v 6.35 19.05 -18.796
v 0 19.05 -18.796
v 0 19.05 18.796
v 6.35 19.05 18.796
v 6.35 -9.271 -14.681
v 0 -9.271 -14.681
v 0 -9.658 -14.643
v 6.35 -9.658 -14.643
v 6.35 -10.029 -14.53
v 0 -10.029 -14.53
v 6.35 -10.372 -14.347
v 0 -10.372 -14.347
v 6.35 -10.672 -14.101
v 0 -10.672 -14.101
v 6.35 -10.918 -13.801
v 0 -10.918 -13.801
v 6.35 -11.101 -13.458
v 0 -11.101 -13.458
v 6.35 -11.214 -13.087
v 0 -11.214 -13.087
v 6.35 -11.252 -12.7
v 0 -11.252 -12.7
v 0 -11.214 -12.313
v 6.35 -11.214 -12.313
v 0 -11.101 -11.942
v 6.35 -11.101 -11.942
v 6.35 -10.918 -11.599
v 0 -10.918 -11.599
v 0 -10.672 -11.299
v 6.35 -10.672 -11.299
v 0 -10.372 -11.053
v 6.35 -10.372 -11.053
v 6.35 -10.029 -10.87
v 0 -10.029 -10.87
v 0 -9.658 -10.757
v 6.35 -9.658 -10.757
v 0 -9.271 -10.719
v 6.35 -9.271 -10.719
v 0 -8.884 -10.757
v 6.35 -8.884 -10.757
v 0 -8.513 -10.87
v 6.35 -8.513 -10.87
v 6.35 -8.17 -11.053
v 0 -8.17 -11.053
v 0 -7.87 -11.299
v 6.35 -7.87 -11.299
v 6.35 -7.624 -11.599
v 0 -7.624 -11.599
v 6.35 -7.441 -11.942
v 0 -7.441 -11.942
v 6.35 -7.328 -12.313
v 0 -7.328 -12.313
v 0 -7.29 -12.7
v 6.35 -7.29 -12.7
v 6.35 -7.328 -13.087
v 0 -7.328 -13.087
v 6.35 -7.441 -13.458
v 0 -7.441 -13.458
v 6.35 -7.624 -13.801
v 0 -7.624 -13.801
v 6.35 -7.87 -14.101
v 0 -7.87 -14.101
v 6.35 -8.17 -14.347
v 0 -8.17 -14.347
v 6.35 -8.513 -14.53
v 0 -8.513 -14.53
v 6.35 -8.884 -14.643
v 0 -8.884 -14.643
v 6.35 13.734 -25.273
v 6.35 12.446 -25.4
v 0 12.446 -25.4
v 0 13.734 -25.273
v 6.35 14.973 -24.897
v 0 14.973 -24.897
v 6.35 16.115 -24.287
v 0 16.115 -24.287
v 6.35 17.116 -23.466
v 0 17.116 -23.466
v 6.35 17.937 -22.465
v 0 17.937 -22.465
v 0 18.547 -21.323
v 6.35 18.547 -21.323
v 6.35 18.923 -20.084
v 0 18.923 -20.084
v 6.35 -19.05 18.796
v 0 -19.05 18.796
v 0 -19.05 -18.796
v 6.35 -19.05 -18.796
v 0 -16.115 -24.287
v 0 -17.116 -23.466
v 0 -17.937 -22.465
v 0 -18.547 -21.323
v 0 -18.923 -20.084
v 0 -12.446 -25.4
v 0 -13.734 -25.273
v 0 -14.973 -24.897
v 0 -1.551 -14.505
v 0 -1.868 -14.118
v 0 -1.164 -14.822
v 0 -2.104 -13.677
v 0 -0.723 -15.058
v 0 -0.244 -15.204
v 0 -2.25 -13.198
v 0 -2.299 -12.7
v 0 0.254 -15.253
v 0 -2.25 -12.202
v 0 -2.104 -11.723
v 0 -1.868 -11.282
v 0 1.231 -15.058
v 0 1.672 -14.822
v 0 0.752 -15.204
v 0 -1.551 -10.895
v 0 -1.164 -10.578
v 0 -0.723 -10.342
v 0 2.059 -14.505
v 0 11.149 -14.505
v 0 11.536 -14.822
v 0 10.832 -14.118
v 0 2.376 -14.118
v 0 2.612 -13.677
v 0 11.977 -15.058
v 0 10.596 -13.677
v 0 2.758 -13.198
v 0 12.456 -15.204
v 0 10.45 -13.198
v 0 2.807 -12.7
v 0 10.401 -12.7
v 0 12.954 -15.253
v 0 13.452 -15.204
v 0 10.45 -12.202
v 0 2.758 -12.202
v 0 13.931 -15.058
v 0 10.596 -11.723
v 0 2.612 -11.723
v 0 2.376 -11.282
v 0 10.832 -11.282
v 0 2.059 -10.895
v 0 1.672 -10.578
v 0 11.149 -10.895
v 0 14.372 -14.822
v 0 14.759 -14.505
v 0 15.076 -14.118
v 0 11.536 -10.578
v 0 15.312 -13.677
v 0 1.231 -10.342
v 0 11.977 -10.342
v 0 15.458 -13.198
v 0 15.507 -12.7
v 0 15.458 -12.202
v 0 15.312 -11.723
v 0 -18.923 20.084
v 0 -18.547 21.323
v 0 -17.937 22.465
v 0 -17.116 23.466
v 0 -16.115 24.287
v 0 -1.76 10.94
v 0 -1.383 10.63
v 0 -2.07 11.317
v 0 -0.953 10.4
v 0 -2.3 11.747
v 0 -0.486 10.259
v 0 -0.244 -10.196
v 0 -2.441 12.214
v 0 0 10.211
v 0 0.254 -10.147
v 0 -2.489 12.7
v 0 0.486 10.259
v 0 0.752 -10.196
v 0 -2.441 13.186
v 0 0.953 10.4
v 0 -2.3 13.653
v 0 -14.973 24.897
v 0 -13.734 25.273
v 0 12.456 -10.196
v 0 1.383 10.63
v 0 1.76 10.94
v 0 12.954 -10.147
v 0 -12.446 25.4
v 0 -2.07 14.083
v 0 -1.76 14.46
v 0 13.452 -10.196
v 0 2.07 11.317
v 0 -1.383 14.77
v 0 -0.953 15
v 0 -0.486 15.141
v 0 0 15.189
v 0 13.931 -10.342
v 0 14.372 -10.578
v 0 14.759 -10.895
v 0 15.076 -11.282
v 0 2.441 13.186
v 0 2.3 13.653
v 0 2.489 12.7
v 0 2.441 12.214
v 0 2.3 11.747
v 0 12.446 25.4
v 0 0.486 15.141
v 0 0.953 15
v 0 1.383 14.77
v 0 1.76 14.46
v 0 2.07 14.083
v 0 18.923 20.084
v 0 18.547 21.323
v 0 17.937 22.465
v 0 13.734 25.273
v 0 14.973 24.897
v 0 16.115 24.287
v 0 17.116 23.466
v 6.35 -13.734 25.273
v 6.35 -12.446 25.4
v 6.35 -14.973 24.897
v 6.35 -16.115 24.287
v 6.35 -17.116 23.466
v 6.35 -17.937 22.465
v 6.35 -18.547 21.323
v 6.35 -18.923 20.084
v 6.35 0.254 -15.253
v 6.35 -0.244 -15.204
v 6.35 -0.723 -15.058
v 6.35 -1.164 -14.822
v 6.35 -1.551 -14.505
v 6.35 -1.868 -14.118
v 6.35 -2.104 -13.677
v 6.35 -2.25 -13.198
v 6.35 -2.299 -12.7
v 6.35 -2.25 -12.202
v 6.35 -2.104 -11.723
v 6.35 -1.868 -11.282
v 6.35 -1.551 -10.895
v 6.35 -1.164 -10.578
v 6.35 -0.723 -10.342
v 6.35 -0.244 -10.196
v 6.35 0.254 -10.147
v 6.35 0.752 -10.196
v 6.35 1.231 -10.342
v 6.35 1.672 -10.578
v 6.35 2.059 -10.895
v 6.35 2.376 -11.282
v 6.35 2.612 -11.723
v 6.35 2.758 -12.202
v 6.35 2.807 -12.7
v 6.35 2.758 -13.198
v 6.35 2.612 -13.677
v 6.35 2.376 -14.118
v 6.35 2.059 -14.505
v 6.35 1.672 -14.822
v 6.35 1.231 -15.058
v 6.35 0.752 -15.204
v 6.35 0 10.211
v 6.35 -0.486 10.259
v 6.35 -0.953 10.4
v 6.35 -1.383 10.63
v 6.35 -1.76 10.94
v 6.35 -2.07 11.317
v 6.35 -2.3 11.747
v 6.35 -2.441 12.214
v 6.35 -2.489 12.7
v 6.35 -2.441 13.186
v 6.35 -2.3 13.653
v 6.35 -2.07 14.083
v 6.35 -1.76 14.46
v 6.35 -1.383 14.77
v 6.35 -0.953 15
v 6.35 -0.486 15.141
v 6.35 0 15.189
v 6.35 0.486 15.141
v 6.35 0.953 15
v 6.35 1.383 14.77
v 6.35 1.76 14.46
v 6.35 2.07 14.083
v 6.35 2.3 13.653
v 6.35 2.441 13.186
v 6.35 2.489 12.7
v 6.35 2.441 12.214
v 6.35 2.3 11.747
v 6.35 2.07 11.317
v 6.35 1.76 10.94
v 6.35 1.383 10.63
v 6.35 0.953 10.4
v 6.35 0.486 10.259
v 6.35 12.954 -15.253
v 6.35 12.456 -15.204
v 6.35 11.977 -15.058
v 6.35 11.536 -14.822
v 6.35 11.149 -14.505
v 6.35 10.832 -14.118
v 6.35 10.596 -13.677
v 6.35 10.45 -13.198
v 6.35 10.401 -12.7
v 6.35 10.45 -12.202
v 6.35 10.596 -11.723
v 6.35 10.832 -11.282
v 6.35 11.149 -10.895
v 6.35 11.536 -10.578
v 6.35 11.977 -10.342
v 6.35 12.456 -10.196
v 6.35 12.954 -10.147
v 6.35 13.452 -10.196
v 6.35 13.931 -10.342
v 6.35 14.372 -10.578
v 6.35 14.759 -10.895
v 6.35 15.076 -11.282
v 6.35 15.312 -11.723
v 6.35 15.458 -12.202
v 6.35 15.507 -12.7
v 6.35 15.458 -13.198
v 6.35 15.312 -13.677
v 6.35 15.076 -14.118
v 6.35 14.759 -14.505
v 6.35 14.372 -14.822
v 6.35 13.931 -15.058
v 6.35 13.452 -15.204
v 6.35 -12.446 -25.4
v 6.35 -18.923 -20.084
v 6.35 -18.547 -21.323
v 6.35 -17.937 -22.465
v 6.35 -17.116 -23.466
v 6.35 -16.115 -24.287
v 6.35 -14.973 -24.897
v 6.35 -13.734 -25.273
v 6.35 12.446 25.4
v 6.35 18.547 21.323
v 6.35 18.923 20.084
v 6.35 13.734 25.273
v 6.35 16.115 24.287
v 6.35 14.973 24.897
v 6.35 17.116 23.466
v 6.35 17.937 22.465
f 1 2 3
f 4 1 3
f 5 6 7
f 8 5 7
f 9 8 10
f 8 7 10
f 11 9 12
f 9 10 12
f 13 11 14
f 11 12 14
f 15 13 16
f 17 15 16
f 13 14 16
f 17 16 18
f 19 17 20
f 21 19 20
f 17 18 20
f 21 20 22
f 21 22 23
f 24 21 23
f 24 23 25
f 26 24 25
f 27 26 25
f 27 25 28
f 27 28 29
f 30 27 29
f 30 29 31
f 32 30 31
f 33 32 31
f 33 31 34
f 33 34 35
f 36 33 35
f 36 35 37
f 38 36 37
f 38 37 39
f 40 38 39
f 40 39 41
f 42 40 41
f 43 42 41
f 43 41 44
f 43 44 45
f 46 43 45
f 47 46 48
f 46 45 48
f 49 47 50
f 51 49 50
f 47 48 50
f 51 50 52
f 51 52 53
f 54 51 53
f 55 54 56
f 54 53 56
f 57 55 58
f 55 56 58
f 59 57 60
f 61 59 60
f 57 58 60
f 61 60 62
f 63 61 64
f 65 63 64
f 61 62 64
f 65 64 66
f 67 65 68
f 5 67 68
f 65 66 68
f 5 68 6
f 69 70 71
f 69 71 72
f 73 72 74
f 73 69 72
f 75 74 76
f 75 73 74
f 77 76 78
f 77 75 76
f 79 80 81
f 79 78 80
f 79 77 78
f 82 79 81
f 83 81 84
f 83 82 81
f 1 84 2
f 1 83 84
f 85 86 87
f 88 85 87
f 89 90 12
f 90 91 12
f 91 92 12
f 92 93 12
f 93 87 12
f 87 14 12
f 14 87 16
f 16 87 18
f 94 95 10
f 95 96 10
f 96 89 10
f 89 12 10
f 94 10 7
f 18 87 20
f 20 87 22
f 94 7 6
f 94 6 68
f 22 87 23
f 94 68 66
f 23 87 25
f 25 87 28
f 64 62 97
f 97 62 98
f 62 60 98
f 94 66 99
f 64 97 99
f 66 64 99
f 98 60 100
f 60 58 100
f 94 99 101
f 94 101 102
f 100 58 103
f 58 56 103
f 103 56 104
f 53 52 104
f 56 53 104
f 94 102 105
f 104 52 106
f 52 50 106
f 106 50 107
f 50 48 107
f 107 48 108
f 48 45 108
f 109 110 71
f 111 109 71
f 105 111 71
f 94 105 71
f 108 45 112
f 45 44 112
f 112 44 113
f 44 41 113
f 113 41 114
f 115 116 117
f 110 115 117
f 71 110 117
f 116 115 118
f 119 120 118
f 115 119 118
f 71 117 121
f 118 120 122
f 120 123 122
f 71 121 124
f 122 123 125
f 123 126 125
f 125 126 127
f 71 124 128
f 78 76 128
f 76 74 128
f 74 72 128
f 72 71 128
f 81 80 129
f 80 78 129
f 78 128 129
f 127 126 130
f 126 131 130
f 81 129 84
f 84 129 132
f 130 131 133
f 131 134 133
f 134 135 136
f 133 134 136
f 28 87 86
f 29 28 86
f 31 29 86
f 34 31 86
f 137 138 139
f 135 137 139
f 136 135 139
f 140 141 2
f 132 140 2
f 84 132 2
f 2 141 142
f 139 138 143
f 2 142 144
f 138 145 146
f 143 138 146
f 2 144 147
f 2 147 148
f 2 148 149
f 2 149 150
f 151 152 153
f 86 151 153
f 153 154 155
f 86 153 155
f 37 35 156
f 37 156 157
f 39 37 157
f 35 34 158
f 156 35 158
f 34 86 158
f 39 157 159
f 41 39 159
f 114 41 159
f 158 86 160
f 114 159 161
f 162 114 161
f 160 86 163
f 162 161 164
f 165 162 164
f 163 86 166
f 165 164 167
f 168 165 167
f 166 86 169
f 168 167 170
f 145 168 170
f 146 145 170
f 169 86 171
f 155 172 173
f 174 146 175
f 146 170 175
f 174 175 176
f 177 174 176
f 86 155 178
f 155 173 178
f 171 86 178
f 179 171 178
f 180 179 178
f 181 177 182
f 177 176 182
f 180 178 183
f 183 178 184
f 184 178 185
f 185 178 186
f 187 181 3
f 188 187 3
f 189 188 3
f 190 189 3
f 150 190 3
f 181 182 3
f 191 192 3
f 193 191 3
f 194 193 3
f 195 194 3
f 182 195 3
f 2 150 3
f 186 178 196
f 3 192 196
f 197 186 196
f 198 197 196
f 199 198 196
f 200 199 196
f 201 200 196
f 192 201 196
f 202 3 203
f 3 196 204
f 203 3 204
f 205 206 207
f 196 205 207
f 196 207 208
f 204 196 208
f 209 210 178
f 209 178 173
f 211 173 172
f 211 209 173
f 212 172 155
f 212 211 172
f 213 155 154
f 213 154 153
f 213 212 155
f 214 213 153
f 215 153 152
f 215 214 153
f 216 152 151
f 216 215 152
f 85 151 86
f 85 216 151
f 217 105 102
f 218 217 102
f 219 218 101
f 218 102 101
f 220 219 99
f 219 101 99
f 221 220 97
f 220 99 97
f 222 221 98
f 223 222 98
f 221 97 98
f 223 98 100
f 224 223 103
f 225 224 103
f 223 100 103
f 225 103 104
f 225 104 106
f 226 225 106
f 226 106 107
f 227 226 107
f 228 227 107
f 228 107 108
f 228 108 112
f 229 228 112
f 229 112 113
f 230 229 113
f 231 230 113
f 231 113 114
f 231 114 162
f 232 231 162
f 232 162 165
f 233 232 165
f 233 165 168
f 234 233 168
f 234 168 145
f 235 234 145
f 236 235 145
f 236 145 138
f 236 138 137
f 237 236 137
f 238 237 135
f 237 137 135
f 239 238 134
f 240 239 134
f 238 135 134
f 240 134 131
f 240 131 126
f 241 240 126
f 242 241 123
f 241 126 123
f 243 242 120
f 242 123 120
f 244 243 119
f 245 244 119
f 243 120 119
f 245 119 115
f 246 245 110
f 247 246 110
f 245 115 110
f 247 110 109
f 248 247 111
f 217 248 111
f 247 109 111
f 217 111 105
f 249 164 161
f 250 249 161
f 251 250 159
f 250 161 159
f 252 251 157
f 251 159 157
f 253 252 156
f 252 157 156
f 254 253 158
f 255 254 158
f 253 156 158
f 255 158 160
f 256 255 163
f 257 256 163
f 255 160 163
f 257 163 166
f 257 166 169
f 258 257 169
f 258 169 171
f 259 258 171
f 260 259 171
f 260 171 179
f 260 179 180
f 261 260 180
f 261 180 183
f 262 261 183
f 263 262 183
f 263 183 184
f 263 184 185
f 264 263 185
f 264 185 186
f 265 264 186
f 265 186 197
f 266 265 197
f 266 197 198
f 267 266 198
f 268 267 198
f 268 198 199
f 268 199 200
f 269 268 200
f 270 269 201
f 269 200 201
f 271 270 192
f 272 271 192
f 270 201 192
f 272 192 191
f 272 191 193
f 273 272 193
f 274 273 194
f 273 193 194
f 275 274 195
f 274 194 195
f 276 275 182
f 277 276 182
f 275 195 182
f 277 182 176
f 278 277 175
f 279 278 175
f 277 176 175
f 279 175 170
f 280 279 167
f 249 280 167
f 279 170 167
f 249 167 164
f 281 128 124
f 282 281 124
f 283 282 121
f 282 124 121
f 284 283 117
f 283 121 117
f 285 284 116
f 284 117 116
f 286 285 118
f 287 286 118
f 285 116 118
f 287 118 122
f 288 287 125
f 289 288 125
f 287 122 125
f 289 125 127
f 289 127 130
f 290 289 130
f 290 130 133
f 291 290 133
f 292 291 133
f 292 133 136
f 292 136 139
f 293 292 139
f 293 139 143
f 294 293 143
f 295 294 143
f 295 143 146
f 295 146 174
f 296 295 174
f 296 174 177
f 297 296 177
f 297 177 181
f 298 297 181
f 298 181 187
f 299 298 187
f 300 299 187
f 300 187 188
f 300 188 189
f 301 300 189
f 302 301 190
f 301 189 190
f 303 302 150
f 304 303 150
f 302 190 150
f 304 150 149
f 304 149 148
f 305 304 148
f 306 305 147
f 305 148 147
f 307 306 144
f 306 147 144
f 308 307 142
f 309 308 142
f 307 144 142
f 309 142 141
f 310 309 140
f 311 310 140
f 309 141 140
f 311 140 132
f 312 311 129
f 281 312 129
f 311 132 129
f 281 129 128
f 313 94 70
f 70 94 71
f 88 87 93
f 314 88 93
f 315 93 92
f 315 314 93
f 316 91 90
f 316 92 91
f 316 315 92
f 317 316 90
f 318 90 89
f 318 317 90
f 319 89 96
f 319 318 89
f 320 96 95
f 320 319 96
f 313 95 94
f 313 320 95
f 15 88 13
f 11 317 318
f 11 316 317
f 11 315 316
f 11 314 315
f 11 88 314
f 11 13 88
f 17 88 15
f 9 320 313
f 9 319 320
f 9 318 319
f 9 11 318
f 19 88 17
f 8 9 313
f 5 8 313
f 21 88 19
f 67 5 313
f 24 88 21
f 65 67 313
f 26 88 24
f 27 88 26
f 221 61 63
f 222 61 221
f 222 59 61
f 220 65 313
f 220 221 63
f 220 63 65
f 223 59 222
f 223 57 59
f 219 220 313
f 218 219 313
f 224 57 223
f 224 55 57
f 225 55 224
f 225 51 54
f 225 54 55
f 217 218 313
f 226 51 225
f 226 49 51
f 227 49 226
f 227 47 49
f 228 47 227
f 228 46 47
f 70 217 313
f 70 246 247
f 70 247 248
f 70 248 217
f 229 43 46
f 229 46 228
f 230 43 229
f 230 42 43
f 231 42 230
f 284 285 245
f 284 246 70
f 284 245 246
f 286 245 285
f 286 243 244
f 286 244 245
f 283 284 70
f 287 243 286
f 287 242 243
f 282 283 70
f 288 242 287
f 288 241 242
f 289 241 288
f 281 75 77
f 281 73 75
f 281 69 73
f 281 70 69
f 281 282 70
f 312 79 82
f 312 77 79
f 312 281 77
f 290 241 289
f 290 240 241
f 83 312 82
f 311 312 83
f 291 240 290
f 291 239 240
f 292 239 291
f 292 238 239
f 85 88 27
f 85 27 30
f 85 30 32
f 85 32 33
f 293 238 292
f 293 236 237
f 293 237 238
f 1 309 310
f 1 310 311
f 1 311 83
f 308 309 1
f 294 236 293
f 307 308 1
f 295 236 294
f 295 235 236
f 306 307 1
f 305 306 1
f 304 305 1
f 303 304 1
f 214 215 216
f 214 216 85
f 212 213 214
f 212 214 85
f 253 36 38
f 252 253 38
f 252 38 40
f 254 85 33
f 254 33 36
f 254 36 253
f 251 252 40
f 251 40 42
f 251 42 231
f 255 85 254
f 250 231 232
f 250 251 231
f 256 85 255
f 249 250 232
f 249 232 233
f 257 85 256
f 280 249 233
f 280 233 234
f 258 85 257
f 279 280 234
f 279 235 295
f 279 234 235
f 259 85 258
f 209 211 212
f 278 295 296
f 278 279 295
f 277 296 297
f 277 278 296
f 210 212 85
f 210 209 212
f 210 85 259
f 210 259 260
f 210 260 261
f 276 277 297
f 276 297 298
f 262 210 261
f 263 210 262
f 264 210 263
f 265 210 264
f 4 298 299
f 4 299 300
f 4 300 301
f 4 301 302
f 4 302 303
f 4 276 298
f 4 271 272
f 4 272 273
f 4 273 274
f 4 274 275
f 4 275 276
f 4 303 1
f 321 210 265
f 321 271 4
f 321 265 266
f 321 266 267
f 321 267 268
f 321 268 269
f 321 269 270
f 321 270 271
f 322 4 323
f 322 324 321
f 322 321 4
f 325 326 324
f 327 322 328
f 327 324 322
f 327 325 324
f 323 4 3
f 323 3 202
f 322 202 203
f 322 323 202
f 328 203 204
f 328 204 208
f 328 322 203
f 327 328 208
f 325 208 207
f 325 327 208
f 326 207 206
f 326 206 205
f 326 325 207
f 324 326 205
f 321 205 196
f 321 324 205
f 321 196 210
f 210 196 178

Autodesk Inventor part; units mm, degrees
ref_plane "YZ Plane" through (0, 0, 0) normal (1, 0, 0) x (0, 1, 0)
ref_plane "XZ Plane" through (0, 0, 0) normal (0, 1, 0) x (-1, 0, 0)
ref_plane "XY Plane" through (0, 0, 0) normal (0, 0, 1) x (1, 0, 0)
sketch "Sketch1" plane through (0, 0, 0) normal (1, 0, 0) x (0, 1, 0)
  line L0 (19.05, 25.4) -> (-19.05, 25.4)
  line L1 (-19.05, 25.4) -> (-19.05, -25.4)
  line L2 (-19.05, -25.4) -> (19.05, -25.4)
  line L3 (19.05, -25.4) -> (19.05, 25.4)
  line L4 (19.05, 25.4) -> (-19.05, -25.4) construction
  line L5 (-19.05, 25.4) -> (19.05, -25.4) construction
  point P0 (0, 0)
  dimension "d0" = 38.1
  dimension "d1" = 50.8
extrude "Extrusion1" add sketch "Sketch1" along normal blind 6.35
sketch "Sketch2" plane through (6.35, 0, 0) normal (1, 0, 0) x (0, 0, -1)
  line L0 (25.4, 19.05) -> (-25.4, 19.05) construction
  line L1 (25.4, -19.05) -> (25.4, 19.05) construction
  point P0 (0, 0)
  point P1 (12.7, 12.954)
  point P2 (12.7, 0.254)
  point P3 (12.7, -9.271)
  dimension "d4" = 12.7
  dimension "d5" = 9.525
  dimension "d6" = 6.096
  dimension "d7" = 12.7
hole "Hole1" at (6.35, 12.954, -12.7) at (6.35, 0.254, -12.7) direction (-1, 0, 0) diameter 5.1054 end through all clearance for "Flat Head Machine Screw (82)" size "#10" standard "Ansi Unified Screw Threads"
hole "Hole2" at (6.35, -9.271, -12.7) direction (-1, 0, 0) diameter 3.9624 end through all thread size "10-32 UNF" class "2B" standard "ANSI Unified Screw Threads"
sketch "Sketch3" plane through (6.35, 0, 0) normal (1, 0, 0) x (0, 0, -1)
  line L0 (-25.4, 19.05) -> (-25.4, -19.05) construction
  point P0 (0, 0)
  point P1 (-12.7, 0)
  dimension "d22" = 12.7
hole "Hole3" at (6.35, 0, 12.7) direction (-1, 0, 0) diameter 4.9784 end through all thread size "1/4-20 UNC" class "2B" standard "ANSI Unified Screw Threads"
fillet "Fillet1" radius 6.604 4 edges at (3.175, 19.05, 25.4) (3.175, 19.05, -25.4) (3.175, -19.05, -25.4) (3.175, -19.05, 25.4)
properties part number "EL2-028" material "Aluminum 6061"
